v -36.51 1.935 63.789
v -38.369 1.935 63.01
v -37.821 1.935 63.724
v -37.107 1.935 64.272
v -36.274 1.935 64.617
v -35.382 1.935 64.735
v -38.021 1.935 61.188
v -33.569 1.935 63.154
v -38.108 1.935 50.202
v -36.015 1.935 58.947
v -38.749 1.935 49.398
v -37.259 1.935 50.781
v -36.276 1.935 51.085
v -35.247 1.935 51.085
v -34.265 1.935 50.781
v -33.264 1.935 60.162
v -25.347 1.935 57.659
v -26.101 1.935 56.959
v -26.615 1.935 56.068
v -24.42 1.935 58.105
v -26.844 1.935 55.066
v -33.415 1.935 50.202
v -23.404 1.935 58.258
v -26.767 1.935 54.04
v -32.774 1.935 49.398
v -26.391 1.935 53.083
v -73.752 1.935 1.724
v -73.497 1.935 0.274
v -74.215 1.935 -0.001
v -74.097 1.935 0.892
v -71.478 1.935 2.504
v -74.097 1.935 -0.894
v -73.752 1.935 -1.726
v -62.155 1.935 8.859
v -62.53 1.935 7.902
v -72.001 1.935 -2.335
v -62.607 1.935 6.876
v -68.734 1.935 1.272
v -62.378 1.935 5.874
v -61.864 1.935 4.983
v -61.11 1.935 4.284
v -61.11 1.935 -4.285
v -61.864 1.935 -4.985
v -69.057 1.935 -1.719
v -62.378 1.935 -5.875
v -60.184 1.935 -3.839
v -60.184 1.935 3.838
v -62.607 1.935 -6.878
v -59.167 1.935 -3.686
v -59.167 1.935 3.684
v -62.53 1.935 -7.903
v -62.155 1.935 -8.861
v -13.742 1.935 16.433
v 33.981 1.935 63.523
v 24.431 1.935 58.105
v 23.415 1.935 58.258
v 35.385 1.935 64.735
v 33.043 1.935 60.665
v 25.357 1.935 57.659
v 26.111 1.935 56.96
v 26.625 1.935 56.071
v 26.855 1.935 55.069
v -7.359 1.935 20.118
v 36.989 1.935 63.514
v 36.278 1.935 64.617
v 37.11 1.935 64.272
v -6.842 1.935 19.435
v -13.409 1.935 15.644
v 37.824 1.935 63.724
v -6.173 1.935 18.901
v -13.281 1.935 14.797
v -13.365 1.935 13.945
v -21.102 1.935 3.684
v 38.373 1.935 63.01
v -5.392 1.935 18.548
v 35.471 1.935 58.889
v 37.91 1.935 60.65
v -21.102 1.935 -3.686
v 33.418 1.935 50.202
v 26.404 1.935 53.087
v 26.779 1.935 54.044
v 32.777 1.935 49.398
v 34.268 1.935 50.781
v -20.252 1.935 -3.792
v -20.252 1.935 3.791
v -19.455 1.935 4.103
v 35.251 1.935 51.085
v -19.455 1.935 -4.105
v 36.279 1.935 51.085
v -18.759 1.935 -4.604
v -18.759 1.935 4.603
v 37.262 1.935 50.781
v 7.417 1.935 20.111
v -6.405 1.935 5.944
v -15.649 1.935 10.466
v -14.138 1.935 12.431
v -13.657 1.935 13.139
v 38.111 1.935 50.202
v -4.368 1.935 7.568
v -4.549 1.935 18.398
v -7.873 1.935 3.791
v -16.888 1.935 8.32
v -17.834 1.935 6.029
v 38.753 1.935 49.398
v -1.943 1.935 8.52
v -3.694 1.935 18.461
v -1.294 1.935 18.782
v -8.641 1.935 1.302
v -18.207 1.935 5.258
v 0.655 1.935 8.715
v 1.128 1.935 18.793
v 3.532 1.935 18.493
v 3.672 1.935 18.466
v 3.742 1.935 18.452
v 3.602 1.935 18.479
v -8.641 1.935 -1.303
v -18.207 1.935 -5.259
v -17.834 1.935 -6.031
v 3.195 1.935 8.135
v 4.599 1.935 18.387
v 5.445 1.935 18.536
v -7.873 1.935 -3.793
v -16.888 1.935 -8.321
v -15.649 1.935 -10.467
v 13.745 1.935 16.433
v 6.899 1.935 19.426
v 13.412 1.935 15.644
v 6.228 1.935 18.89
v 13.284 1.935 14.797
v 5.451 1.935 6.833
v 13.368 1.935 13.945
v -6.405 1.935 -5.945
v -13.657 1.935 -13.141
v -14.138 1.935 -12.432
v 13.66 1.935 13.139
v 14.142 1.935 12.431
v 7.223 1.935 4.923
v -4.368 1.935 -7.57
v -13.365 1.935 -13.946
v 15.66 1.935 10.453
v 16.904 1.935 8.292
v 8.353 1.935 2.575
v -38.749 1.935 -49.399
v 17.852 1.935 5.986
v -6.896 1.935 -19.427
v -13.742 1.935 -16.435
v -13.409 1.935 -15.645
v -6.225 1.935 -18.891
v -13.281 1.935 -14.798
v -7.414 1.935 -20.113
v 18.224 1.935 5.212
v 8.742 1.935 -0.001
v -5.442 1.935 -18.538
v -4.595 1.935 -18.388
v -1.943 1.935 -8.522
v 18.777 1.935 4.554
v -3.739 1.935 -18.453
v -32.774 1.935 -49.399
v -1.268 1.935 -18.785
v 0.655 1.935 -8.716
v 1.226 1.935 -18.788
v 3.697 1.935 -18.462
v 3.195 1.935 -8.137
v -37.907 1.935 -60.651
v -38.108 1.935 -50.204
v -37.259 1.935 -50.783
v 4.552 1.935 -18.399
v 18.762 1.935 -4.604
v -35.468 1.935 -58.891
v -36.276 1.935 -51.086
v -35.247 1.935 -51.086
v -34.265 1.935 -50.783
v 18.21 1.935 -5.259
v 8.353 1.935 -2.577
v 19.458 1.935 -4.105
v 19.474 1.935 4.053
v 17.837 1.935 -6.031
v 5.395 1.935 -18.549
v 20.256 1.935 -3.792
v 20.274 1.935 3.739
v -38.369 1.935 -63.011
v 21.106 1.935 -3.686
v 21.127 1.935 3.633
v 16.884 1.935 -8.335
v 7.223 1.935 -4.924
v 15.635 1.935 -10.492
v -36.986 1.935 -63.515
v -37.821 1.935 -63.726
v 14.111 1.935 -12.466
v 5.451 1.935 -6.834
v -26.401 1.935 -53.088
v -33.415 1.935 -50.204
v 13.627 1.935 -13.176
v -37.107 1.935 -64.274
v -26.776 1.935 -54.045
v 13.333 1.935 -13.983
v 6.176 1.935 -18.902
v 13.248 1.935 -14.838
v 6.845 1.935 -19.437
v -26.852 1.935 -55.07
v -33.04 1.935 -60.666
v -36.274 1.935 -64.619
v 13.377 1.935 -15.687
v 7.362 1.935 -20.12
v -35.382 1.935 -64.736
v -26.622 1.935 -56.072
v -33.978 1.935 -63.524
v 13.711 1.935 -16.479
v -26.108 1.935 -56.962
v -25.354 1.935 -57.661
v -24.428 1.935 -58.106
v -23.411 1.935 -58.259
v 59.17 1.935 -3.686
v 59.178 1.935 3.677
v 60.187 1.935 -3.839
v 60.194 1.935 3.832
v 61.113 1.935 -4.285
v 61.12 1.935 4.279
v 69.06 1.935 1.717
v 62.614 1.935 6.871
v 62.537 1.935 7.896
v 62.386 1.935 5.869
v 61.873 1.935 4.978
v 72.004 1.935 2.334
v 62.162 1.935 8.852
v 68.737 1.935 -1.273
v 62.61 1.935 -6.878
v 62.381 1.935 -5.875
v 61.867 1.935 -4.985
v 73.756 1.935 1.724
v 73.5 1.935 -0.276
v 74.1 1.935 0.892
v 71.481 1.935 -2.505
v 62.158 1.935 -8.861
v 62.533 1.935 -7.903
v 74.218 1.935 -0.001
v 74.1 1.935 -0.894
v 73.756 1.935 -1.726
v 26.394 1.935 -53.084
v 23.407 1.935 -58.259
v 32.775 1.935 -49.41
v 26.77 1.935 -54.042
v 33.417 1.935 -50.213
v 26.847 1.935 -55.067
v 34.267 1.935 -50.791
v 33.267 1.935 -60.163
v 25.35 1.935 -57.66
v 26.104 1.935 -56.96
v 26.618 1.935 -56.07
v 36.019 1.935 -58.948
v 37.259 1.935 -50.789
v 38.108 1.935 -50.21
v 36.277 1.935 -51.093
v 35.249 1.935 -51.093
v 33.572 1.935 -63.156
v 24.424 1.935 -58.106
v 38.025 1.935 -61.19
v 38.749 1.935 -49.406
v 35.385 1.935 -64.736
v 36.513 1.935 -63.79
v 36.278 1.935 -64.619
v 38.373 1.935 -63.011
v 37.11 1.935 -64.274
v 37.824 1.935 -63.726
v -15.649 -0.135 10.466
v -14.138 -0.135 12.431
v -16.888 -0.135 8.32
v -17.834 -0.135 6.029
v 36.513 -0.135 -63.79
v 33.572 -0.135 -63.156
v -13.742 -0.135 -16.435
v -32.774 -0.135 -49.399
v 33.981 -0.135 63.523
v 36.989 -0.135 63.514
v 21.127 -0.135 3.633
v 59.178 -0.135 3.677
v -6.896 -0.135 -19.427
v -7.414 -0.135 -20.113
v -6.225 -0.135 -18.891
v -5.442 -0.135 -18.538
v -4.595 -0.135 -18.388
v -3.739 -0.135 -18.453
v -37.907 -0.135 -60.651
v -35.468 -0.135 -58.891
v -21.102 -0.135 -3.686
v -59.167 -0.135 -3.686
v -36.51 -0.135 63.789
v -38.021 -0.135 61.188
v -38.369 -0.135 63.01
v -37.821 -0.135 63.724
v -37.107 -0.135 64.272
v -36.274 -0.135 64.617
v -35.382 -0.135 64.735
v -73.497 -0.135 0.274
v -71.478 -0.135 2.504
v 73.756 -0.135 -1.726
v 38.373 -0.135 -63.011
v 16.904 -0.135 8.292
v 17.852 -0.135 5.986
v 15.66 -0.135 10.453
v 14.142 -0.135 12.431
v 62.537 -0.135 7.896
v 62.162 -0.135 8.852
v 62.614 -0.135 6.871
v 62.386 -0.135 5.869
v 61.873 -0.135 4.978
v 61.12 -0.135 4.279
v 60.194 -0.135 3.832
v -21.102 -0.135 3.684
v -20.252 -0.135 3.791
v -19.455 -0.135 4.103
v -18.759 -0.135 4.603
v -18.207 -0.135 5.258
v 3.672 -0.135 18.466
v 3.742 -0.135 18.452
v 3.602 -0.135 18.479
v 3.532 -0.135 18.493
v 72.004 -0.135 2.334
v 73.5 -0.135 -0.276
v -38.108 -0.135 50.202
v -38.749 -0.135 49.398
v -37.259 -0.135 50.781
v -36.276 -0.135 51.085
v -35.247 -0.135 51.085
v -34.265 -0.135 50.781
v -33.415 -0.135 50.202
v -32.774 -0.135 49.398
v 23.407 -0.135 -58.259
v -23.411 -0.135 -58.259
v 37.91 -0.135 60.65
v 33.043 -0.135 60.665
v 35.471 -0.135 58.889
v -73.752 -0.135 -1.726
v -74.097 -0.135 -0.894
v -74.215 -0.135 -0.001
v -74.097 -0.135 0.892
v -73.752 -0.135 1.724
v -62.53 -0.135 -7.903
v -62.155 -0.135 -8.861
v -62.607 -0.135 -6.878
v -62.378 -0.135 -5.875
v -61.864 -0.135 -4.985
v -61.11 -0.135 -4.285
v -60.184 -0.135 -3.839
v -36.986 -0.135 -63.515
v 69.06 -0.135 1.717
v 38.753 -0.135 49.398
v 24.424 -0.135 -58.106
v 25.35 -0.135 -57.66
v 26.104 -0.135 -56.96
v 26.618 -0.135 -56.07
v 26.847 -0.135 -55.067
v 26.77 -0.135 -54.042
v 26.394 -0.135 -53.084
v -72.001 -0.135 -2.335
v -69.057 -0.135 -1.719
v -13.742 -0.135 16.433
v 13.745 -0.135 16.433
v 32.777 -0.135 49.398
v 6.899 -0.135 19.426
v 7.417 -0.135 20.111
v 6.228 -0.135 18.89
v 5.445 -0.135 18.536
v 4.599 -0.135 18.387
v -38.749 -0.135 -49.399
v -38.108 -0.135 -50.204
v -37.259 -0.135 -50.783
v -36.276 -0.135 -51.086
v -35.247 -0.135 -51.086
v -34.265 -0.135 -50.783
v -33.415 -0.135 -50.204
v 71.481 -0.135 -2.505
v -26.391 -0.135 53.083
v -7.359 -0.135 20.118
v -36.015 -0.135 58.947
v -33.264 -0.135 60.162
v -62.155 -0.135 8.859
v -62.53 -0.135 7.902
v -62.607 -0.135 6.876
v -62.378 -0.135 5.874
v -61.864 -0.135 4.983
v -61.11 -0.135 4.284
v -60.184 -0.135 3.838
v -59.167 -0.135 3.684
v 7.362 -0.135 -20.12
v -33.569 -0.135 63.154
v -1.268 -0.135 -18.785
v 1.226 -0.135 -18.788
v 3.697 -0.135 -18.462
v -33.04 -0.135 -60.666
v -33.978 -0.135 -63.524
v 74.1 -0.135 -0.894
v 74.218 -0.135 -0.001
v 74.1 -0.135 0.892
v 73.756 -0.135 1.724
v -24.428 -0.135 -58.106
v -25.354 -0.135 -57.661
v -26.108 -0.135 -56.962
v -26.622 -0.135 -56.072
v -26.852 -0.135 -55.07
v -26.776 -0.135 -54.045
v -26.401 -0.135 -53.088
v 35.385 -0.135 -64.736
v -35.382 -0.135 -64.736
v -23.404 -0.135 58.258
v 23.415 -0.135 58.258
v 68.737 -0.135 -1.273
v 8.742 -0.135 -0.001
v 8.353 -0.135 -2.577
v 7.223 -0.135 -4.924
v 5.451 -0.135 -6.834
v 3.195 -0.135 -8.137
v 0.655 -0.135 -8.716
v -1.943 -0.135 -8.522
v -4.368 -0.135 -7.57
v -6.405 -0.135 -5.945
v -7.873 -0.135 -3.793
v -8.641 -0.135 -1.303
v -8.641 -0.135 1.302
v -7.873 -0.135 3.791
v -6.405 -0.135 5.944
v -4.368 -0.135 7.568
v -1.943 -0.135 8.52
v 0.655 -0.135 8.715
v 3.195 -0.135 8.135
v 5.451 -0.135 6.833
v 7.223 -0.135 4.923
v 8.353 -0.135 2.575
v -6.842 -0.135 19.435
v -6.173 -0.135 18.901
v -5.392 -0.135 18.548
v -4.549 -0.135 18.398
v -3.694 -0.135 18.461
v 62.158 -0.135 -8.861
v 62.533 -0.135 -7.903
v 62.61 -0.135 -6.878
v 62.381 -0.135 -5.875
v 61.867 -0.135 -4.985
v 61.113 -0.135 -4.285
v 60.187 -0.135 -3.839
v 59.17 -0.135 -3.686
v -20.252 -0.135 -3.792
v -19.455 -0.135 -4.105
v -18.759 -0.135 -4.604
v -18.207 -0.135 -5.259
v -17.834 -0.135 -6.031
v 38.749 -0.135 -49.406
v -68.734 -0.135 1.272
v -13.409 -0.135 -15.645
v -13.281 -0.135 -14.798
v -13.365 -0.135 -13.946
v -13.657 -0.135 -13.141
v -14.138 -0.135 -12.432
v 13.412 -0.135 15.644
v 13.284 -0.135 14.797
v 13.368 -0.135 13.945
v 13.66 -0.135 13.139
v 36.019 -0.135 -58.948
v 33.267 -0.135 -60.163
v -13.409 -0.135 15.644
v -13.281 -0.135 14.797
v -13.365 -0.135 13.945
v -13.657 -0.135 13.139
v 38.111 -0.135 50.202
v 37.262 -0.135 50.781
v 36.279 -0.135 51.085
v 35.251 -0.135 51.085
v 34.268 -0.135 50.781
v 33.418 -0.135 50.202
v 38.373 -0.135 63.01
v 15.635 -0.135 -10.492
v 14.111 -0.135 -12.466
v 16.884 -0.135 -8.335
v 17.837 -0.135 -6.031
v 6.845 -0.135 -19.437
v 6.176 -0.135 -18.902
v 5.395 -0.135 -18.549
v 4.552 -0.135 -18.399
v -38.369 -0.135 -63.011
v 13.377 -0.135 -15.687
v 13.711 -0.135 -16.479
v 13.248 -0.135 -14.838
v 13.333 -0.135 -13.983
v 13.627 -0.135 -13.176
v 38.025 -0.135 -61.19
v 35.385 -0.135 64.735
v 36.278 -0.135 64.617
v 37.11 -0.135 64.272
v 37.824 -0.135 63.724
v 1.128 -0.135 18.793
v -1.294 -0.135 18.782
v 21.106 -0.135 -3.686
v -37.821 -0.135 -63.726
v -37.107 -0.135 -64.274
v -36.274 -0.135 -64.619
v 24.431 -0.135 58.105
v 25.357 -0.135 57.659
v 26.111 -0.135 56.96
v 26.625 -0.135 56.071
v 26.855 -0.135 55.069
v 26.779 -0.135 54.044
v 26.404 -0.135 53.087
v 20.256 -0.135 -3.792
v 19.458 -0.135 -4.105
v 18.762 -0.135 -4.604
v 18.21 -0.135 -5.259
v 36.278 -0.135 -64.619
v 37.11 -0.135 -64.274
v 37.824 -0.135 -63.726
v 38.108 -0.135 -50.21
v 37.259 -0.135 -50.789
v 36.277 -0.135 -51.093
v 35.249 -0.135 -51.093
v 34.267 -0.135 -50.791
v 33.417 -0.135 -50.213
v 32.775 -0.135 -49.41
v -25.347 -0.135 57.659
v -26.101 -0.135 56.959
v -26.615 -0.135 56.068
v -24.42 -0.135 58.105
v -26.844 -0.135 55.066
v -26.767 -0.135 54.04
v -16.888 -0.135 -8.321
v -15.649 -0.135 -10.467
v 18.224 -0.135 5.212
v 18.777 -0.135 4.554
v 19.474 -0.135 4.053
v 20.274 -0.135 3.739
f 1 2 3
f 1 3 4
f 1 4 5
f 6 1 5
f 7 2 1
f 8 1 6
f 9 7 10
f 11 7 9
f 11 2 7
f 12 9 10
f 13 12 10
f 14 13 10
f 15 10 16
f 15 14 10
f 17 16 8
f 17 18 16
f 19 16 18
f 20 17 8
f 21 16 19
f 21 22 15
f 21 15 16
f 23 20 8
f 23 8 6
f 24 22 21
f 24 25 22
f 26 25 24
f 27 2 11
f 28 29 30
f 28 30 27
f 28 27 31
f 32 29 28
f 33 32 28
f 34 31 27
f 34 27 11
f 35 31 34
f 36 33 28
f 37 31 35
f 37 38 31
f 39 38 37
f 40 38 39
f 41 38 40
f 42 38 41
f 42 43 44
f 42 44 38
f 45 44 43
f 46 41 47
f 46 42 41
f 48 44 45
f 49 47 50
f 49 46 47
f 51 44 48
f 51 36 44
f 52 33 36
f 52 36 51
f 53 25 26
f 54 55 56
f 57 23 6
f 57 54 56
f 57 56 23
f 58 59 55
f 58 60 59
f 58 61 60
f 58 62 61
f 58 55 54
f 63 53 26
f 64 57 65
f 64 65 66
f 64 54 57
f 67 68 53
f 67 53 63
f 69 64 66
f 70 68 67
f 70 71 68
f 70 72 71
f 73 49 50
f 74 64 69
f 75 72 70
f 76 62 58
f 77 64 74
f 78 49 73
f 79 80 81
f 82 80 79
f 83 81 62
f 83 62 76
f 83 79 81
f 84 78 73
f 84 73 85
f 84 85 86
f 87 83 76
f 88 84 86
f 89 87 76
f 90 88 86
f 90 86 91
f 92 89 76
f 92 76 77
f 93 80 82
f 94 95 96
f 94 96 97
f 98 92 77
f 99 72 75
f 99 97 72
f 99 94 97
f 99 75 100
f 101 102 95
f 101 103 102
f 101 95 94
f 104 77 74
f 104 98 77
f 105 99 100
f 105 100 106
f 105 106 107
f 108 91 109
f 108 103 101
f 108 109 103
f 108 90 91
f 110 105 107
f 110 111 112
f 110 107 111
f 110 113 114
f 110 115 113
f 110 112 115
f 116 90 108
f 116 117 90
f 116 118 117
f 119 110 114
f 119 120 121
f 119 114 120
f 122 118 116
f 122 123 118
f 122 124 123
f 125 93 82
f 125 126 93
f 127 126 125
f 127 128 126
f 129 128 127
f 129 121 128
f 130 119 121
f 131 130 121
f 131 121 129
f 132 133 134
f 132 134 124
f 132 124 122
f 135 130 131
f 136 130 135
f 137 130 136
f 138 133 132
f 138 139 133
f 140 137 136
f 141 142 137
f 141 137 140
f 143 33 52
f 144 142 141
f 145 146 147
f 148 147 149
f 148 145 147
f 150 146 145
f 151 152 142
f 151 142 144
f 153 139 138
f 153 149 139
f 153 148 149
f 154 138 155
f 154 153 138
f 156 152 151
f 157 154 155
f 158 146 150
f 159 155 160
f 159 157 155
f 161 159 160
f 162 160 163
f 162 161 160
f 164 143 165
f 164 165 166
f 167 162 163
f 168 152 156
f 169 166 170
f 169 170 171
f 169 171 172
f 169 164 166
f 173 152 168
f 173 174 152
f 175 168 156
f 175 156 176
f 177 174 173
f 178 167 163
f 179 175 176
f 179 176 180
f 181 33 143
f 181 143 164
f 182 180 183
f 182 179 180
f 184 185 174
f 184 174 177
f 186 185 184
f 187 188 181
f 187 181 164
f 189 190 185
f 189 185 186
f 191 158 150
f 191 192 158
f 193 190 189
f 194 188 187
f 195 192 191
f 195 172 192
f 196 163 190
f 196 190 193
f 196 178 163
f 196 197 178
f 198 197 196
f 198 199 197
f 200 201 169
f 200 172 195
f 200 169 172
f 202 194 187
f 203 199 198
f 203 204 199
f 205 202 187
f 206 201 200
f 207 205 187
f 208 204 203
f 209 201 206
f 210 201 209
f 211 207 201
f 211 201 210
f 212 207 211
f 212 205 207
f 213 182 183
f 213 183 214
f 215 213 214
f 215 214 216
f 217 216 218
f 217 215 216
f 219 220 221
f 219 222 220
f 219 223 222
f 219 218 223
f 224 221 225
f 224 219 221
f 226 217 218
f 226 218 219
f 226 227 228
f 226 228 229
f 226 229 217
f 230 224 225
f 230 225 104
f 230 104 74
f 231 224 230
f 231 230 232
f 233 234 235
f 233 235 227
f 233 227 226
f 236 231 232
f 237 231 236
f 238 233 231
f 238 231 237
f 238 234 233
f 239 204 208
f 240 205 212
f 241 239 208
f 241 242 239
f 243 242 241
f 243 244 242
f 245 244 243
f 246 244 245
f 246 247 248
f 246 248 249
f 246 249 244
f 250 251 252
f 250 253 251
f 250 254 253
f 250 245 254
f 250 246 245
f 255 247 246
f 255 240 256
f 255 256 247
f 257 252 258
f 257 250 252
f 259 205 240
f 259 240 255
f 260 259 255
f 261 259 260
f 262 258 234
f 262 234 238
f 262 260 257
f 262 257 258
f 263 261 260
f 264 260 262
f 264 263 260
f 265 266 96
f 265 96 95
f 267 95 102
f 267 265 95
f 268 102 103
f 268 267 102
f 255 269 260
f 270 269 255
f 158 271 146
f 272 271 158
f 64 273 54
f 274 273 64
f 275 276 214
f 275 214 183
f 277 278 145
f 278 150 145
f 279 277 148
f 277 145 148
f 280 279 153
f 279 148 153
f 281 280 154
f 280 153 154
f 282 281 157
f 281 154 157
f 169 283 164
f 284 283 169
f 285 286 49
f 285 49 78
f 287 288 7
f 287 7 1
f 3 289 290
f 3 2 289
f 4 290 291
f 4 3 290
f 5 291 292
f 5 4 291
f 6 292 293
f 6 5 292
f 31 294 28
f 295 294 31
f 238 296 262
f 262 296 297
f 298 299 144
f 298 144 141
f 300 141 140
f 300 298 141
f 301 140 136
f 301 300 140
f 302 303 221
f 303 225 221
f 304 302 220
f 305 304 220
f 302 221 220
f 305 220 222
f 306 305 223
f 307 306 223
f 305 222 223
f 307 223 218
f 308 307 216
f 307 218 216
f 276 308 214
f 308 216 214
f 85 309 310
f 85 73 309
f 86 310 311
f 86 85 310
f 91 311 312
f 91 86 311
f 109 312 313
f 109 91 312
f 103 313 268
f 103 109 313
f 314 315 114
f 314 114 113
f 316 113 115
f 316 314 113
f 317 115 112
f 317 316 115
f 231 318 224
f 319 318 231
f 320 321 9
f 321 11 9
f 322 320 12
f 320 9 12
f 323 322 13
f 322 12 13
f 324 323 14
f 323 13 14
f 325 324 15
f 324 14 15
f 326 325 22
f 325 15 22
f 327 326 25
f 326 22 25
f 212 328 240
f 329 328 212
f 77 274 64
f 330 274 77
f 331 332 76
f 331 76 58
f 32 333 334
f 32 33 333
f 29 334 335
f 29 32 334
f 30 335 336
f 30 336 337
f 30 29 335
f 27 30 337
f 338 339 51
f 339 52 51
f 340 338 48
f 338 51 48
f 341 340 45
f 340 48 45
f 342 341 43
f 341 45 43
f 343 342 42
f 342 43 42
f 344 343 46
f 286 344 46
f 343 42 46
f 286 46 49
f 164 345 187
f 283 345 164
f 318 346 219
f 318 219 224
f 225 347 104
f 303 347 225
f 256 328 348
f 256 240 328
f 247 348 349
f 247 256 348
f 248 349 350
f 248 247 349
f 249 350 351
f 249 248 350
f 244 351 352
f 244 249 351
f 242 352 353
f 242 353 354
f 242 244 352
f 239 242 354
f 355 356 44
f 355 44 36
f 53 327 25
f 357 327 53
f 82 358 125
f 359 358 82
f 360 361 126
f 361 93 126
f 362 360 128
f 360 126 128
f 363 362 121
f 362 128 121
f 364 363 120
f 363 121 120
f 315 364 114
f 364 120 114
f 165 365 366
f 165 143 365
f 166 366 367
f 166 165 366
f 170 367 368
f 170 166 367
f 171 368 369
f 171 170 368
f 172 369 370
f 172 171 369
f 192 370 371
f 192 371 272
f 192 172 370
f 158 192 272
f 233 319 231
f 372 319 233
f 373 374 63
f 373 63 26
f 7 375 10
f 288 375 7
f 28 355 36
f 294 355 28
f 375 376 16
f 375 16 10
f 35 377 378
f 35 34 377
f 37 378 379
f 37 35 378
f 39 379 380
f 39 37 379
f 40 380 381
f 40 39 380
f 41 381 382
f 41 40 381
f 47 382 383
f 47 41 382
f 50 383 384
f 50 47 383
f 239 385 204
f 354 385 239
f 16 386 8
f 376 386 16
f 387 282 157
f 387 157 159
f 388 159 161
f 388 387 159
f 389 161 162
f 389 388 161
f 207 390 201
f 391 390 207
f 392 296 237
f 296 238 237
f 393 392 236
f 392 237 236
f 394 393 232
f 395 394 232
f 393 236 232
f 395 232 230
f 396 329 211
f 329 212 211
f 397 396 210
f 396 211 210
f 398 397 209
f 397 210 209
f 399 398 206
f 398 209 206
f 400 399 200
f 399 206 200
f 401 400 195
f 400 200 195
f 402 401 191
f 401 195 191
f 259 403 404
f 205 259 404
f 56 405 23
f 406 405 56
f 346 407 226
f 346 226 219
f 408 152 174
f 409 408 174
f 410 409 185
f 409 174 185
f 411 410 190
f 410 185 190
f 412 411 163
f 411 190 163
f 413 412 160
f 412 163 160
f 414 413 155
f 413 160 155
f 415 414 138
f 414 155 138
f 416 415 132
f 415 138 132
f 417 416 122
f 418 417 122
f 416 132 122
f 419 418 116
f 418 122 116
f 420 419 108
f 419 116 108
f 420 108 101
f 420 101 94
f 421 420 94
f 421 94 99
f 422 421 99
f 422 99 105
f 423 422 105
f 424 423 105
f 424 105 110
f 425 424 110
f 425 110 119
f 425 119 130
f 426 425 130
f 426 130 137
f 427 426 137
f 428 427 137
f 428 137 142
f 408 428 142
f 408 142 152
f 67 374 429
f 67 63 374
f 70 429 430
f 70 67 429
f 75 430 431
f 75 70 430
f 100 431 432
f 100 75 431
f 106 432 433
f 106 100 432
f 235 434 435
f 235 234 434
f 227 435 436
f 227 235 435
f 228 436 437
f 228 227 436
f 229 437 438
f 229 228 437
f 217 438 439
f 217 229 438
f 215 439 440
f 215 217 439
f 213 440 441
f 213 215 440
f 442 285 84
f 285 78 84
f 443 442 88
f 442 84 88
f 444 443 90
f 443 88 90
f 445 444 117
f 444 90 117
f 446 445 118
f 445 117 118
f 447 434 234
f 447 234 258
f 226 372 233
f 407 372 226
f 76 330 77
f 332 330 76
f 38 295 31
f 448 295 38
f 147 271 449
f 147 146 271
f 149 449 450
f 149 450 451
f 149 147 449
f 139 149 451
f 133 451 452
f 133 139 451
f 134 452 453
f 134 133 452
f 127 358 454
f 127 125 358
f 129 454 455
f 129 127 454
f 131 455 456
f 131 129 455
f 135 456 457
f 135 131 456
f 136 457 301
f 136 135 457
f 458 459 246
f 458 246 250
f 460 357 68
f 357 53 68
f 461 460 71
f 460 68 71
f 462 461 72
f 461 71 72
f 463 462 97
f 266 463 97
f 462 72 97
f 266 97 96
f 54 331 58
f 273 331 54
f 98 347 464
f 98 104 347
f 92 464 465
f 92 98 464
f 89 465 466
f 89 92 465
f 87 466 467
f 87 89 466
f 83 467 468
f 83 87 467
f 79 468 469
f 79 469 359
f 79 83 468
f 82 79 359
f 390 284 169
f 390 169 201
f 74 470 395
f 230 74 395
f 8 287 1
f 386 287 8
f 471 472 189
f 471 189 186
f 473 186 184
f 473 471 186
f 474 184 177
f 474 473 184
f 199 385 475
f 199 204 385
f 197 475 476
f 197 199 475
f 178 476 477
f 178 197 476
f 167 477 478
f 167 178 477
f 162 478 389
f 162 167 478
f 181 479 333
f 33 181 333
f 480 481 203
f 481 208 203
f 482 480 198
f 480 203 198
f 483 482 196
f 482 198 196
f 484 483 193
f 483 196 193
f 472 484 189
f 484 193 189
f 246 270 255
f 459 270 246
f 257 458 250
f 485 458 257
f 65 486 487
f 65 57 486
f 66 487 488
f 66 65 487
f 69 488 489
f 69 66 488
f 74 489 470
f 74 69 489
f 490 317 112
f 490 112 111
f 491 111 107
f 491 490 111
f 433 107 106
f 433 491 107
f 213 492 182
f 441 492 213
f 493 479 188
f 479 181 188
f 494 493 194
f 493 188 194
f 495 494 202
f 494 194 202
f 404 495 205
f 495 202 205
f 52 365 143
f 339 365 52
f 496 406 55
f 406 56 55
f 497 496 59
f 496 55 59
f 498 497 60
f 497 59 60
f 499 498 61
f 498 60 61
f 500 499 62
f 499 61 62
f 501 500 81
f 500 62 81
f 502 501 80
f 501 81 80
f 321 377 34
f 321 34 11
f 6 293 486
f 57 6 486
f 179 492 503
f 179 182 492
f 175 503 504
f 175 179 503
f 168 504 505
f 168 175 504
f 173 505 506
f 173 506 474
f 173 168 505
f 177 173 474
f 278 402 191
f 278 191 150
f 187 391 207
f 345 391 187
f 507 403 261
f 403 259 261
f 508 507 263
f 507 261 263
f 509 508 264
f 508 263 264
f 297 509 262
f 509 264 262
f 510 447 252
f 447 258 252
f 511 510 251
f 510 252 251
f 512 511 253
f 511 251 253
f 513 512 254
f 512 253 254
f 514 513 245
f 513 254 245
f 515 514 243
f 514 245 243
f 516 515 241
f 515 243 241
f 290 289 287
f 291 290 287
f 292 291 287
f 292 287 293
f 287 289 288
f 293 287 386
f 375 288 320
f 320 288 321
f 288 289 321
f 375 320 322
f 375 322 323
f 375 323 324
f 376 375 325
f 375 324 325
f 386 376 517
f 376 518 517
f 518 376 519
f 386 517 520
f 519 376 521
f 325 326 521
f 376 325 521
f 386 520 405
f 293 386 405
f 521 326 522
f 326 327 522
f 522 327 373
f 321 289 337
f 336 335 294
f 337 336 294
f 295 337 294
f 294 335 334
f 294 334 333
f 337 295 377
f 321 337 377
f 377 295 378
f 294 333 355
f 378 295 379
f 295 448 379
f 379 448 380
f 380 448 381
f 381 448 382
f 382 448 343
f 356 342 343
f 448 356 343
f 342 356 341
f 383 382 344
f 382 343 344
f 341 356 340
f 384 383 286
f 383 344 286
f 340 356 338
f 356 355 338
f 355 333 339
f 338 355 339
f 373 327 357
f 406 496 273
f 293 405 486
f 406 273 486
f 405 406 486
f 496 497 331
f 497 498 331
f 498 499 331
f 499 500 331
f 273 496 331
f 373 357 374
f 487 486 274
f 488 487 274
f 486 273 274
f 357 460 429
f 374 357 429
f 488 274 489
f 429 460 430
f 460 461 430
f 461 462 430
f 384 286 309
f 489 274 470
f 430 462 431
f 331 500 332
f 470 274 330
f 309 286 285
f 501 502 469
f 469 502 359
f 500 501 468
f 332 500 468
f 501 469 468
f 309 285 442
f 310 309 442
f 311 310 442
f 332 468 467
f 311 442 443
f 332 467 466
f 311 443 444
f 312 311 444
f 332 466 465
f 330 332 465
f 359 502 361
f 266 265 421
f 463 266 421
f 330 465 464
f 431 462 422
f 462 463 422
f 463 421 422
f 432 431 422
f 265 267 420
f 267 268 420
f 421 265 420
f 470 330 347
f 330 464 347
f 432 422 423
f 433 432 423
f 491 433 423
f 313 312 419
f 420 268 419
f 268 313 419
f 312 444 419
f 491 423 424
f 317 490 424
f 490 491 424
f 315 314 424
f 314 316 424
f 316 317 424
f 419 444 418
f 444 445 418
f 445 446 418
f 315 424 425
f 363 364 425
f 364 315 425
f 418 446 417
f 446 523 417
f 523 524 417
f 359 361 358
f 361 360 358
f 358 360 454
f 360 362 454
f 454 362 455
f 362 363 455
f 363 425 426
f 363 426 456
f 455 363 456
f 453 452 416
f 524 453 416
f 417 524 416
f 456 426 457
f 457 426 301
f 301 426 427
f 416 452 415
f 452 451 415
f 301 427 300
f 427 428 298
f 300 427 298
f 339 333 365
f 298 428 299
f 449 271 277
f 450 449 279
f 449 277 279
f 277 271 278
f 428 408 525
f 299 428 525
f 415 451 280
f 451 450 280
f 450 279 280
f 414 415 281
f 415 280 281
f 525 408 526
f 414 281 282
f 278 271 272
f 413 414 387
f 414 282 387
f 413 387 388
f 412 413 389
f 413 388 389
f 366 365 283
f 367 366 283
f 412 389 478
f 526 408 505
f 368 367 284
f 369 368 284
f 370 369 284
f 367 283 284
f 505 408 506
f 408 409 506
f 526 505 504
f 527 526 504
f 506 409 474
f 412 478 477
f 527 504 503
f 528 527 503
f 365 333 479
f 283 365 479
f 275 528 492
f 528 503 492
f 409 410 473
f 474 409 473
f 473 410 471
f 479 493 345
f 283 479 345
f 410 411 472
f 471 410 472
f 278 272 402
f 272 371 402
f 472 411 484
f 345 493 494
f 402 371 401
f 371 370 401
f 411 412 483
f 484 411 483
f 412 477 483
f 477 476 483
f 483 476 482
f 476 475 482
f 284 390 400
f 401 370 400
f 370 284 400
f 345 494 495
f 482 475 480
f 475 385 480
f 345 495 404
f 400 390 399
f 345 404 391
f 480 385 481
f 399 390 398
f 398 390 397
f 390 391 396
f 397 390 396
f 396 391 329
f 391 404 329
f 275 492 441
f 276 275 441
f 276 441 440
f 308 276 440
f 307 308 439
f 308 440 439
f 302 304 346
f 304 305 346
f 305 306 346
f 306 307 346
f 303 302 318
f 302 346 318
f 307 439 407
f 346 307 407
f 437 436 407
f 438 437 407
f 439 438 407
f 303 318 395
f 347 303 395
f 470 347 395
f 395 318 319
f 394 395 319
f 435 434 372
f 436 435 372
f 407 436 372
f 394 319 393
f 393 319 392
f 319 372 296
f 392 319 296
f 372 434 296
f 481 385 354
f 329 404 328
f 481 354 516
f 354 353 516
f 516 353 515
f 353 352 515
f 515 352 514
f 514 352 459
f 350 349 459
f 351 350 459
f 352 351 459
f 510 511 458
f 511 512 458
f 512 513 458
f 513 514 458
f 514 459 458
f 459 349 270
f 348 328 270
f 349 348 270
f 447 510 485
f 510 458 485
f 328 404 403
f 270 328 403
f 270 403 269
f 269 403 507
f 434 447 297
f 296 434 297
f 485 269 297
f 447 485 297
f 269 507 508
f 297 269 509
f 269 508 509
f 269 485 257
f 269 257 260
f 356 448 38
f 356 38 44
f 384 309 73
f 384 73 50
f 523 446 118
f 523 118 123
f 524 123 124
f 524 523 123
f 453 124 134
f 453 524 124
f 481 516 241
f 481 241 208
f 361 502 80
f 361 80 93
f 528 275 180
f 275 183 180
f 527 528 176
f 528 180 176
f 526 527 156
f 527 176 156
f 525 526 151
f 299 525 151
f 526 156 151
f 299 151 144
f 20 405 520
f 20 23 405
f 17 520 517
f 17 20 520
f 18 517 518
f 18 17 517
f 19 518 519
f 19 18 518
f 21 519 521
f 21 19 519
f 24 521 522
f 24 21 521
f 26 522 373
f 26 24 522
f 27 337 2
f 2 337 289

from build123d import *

# Parameters (mm, degrees)
BOSS_EXTRUDE1_DEPTH = 1.8
FILLET1_R           = 3
FILLET2_R           = 3
SKETCH3_R           = 7.6
CUT_EXTRUDE1_DEPTH  = 10
SCALE1_SCALE        = 1.15


with BuildPart() as part:
    # Sketch1 → Boss-Extrude1 (new body)
    with BuildSketch(Plane(origin=(0, 0, 0), x_dir=(1, 0, 0), z_dir=(0, 1, 0))):
        Polygon((-32.5, 56.291651246), (-65, 0), (-32.5, -56.291651246), (32.5, -56.291651246), (65, 0), (32.5, 56.291651246), align=None)
        with BuildLine():
            Line((-31.098446917, 47.455472674), (-56.646868343, 3.204308711))
            Line((-56.646868343, 3.204308711), (-16.055097208, 3.204308711))
            ThreePointArc((-16.055097208, 3.204308711), (-14.178339307, 8.185868015), (-10.802561349, 12.301967686))
            Line((-10.802561349, 12.301967686), (-31.098446917, 47.455472674))
        make_face(mode=Mode.SUBTRACT)
        with BuildLine():
            Line((-56.646868343, -3.204308711), (-31.098446917, -47.455472674))
            Line((-31.098446917, -47.455472674), (-10.802561349, -12.301967686))
            ThreePointArc((-10.802561349, -12.301967686), (-14.178339307, -8.185868015), (-16.055097208, -3.204308711))
            Line((-16.055097208, -3.204308711), (-56.646868343, -3.204308711))
        make_face(mode=Mode.SUBTRACT)
        with BuildLine():
            Line((-25.548421426, -50.659781385), (3, -50.659781385))
            Line((3, -50.659781385), (25.548291416, -50.659781385))
            Line((25.548291416, -50.659781385), (5.29797501, -15.490810226))
            ThreePointArc((5.29797501, -15.490810226), (4.194244938, -15.825360977), (3.069700506, -16.08137679))
            ThreePointArc((3.069700506, -16.08137679), (-1.128661889, -16.332784913), (-5.252535858, -15.506276397))
            Line((-5.252535858, -15.506276397), (-25.548421426, -50.659781385))
        make_face(mode=Mode.SUBTRACT)
        with BuildLine():
            Line((31.098446917, -47.455472674), (56.646803338, -3.204421303))
            Line((56.646803338, -3.204421303), (16.064422686, -3.157224166))
            ThreePointArc((16.064422686, -3.157224166), (14.190323862, -8.165074976), (10.802561349, -12.301967686))
            Line((10.802561349, -12.301967686), (31.098446917, -47.455472674))
        make_face(mode=Mode.SUBTRACT)
        with BuildLine():
            Line((56.646868343, 3.204308711), (31.098511922, 47.455360082))
            Line((31.098511922, 47.455360082), (10.766447676, 12.33358606))
            ThreePointArc((10.766447676, 12.33358606), (14.166324284, 8.206643464), (16.055097208, 3.204308711))
            Line((16.055097208, 3.204308711), (56.646868343, 3.204308711))
        make_face(mode=Mode.SUBTRACT)
        with BuildLine():
            Line((25.548421426, 50.659781385), (-25.548291416, 50.659781385))
            Line((-25.548291416, 50.659781385), (-5.29797501, 15.490810226))
            ThreePointArc((-5.29797501, 15.490810226), (-0.023999578, 16.37171844), (5.252535858, 15.506276397))
            Line((5.252535858, 15.506276397), (25.548421426, 50.659781385))
        make_face(mode=Mode.SUBTRACT)
        Polygon((28.926541222, 52.315471461), (31.319181202, 51.258876955), (33.063428707, 53.207907141), (31.748792971, 55.469068546), (29.192055897, 54.917512964), align=None, mode=Mode.SUBTRACT)
        Polygon((-30.843256685, 51.208855273), (-28.731899012, 52.752645025), (-29.547684912, 55.237722767), (-32.163226, 55.229795525), (-32.963933391, 52.739818478), align=None, mode=Mode.SUBTRACT)
        Polygon((59.769797908, 1.106616188), (60.051080214, -1.493768069), (62.61111362, -2.029815626), (63.912018971, 0.239273021), (62.155989288, 2.177694486), align=None, mode=Mode.SUBTRACT)
        Polygon((30.843256685, -51.208855273), (28.731899012, -52.752645025), (29.547684912, -55.237722767), (32.163226, -55.229795525), (32.963933391, -52.739818478), align=None, mode=Mode.SUBTRACT)
        Polygon((-28.926541222, -52.315471461), (-31.319181202, -51.258876955), (-33.063428707, -53.207907141), (-31.748792971, -55.469068546), (-29.192055897, -54.917512964), align=None, mode=Mode.SUBTRACT)
        Polygon((-59.769797908, -1.106616188), (-60.051080214, 1.493768069), (-62.61111362, 2.029815626), (-63.912018971, -0.239273021), (-62.155989288, -2.177694486), align=None, mode=Mode.SUBTRACT)
    extrude(amount=BOSS_EXTRUDE1_DEPTH)

    # Fillet1
    fillet1_edges = [part.edges().sort_by_distance(p)[0] for p in [
        (32.5, 0.9, -56.291651246),
        (65, 0.9, 0),
        (32.5, 0.9, 56.291651246),
        (-32.5, 0.9, 56.291651246),
        (-65, 0.9, 0),
        (-32.5, 0.9, -56.291651246),
    ]]
    fillet(fillet1_edges, radius=FILLET1_R)

    # Fillet2
    fillet2_edges = [part.edges().sort_by_distance(p)[0] for p in [
        (5.29797501, 0.9, 15.490810226),
        (-5.252535858, 0.9, 15.506276397),
        (-25.548421426, 0.9, 50.659781385),
        (25.548291416, 0.9, 50.659781385),
        (-25.548291416, 0.9, -50.659781385),
        (-5.29797501, 0.9, -15.490810226),
        (5.252535858, 0.9, -15.506276397),
        (25.548421426, 0.9, -50.659781385),
        (31.098511922, 0.9, -47.455360082),
        (10.766447676, 0.9, -12.33358606),
        (16.055097208, 0.9, -3.204308711),
        (56.646868343, 0.9, -3.204308711),
        (56.646803338, 0.9, 3.204421303),
        (16.064422686, 0.9, 3.157224166),
        (10.802561349, 0.9, 12.301967686),
        (31.098446917, 0.9, 47.455472674),
        (-31.098446917, 0.9, 47.455472674),
        (-10.802561349, 0.9, 12.301967686),
        (-16.055097208, 0.9, 3.204308711),
        (-56.646868343, 0.9, 3.204308711),
        (-10.802561349, 0.9, -12.301967686),
        (-31.098446917, 0.9, -47.455472674),
        (-56.646868343, 0.9, -3.204308711),
        (-16.055097208, 0.9, -3.204308711),
    ]]
    fillet(fillet2_edges, radius=FILLET2_R)

    # Sketch3 → Cut-Extrude1 (cut)
    with BuildSketch(Plane(origin=(0, 3.6, 0), x_dir=(1, 0, 0), z_dir=(0, 1, 0))):
        Circle(SKETCH3_R)
    extrude(amount=-CUT_EXTRUDE1_DEPTH, mode=Mode.SUBTRACT)


with BuildPart() as part_1:
    # Scale1: scaled about (-0.010587945, 0.9, 0.004669606)
    add(part.part.scale(SCALE1_SCALE).moved(Location((0.001588192, -0.135, -0.000700441))))


solid = part_1.part
